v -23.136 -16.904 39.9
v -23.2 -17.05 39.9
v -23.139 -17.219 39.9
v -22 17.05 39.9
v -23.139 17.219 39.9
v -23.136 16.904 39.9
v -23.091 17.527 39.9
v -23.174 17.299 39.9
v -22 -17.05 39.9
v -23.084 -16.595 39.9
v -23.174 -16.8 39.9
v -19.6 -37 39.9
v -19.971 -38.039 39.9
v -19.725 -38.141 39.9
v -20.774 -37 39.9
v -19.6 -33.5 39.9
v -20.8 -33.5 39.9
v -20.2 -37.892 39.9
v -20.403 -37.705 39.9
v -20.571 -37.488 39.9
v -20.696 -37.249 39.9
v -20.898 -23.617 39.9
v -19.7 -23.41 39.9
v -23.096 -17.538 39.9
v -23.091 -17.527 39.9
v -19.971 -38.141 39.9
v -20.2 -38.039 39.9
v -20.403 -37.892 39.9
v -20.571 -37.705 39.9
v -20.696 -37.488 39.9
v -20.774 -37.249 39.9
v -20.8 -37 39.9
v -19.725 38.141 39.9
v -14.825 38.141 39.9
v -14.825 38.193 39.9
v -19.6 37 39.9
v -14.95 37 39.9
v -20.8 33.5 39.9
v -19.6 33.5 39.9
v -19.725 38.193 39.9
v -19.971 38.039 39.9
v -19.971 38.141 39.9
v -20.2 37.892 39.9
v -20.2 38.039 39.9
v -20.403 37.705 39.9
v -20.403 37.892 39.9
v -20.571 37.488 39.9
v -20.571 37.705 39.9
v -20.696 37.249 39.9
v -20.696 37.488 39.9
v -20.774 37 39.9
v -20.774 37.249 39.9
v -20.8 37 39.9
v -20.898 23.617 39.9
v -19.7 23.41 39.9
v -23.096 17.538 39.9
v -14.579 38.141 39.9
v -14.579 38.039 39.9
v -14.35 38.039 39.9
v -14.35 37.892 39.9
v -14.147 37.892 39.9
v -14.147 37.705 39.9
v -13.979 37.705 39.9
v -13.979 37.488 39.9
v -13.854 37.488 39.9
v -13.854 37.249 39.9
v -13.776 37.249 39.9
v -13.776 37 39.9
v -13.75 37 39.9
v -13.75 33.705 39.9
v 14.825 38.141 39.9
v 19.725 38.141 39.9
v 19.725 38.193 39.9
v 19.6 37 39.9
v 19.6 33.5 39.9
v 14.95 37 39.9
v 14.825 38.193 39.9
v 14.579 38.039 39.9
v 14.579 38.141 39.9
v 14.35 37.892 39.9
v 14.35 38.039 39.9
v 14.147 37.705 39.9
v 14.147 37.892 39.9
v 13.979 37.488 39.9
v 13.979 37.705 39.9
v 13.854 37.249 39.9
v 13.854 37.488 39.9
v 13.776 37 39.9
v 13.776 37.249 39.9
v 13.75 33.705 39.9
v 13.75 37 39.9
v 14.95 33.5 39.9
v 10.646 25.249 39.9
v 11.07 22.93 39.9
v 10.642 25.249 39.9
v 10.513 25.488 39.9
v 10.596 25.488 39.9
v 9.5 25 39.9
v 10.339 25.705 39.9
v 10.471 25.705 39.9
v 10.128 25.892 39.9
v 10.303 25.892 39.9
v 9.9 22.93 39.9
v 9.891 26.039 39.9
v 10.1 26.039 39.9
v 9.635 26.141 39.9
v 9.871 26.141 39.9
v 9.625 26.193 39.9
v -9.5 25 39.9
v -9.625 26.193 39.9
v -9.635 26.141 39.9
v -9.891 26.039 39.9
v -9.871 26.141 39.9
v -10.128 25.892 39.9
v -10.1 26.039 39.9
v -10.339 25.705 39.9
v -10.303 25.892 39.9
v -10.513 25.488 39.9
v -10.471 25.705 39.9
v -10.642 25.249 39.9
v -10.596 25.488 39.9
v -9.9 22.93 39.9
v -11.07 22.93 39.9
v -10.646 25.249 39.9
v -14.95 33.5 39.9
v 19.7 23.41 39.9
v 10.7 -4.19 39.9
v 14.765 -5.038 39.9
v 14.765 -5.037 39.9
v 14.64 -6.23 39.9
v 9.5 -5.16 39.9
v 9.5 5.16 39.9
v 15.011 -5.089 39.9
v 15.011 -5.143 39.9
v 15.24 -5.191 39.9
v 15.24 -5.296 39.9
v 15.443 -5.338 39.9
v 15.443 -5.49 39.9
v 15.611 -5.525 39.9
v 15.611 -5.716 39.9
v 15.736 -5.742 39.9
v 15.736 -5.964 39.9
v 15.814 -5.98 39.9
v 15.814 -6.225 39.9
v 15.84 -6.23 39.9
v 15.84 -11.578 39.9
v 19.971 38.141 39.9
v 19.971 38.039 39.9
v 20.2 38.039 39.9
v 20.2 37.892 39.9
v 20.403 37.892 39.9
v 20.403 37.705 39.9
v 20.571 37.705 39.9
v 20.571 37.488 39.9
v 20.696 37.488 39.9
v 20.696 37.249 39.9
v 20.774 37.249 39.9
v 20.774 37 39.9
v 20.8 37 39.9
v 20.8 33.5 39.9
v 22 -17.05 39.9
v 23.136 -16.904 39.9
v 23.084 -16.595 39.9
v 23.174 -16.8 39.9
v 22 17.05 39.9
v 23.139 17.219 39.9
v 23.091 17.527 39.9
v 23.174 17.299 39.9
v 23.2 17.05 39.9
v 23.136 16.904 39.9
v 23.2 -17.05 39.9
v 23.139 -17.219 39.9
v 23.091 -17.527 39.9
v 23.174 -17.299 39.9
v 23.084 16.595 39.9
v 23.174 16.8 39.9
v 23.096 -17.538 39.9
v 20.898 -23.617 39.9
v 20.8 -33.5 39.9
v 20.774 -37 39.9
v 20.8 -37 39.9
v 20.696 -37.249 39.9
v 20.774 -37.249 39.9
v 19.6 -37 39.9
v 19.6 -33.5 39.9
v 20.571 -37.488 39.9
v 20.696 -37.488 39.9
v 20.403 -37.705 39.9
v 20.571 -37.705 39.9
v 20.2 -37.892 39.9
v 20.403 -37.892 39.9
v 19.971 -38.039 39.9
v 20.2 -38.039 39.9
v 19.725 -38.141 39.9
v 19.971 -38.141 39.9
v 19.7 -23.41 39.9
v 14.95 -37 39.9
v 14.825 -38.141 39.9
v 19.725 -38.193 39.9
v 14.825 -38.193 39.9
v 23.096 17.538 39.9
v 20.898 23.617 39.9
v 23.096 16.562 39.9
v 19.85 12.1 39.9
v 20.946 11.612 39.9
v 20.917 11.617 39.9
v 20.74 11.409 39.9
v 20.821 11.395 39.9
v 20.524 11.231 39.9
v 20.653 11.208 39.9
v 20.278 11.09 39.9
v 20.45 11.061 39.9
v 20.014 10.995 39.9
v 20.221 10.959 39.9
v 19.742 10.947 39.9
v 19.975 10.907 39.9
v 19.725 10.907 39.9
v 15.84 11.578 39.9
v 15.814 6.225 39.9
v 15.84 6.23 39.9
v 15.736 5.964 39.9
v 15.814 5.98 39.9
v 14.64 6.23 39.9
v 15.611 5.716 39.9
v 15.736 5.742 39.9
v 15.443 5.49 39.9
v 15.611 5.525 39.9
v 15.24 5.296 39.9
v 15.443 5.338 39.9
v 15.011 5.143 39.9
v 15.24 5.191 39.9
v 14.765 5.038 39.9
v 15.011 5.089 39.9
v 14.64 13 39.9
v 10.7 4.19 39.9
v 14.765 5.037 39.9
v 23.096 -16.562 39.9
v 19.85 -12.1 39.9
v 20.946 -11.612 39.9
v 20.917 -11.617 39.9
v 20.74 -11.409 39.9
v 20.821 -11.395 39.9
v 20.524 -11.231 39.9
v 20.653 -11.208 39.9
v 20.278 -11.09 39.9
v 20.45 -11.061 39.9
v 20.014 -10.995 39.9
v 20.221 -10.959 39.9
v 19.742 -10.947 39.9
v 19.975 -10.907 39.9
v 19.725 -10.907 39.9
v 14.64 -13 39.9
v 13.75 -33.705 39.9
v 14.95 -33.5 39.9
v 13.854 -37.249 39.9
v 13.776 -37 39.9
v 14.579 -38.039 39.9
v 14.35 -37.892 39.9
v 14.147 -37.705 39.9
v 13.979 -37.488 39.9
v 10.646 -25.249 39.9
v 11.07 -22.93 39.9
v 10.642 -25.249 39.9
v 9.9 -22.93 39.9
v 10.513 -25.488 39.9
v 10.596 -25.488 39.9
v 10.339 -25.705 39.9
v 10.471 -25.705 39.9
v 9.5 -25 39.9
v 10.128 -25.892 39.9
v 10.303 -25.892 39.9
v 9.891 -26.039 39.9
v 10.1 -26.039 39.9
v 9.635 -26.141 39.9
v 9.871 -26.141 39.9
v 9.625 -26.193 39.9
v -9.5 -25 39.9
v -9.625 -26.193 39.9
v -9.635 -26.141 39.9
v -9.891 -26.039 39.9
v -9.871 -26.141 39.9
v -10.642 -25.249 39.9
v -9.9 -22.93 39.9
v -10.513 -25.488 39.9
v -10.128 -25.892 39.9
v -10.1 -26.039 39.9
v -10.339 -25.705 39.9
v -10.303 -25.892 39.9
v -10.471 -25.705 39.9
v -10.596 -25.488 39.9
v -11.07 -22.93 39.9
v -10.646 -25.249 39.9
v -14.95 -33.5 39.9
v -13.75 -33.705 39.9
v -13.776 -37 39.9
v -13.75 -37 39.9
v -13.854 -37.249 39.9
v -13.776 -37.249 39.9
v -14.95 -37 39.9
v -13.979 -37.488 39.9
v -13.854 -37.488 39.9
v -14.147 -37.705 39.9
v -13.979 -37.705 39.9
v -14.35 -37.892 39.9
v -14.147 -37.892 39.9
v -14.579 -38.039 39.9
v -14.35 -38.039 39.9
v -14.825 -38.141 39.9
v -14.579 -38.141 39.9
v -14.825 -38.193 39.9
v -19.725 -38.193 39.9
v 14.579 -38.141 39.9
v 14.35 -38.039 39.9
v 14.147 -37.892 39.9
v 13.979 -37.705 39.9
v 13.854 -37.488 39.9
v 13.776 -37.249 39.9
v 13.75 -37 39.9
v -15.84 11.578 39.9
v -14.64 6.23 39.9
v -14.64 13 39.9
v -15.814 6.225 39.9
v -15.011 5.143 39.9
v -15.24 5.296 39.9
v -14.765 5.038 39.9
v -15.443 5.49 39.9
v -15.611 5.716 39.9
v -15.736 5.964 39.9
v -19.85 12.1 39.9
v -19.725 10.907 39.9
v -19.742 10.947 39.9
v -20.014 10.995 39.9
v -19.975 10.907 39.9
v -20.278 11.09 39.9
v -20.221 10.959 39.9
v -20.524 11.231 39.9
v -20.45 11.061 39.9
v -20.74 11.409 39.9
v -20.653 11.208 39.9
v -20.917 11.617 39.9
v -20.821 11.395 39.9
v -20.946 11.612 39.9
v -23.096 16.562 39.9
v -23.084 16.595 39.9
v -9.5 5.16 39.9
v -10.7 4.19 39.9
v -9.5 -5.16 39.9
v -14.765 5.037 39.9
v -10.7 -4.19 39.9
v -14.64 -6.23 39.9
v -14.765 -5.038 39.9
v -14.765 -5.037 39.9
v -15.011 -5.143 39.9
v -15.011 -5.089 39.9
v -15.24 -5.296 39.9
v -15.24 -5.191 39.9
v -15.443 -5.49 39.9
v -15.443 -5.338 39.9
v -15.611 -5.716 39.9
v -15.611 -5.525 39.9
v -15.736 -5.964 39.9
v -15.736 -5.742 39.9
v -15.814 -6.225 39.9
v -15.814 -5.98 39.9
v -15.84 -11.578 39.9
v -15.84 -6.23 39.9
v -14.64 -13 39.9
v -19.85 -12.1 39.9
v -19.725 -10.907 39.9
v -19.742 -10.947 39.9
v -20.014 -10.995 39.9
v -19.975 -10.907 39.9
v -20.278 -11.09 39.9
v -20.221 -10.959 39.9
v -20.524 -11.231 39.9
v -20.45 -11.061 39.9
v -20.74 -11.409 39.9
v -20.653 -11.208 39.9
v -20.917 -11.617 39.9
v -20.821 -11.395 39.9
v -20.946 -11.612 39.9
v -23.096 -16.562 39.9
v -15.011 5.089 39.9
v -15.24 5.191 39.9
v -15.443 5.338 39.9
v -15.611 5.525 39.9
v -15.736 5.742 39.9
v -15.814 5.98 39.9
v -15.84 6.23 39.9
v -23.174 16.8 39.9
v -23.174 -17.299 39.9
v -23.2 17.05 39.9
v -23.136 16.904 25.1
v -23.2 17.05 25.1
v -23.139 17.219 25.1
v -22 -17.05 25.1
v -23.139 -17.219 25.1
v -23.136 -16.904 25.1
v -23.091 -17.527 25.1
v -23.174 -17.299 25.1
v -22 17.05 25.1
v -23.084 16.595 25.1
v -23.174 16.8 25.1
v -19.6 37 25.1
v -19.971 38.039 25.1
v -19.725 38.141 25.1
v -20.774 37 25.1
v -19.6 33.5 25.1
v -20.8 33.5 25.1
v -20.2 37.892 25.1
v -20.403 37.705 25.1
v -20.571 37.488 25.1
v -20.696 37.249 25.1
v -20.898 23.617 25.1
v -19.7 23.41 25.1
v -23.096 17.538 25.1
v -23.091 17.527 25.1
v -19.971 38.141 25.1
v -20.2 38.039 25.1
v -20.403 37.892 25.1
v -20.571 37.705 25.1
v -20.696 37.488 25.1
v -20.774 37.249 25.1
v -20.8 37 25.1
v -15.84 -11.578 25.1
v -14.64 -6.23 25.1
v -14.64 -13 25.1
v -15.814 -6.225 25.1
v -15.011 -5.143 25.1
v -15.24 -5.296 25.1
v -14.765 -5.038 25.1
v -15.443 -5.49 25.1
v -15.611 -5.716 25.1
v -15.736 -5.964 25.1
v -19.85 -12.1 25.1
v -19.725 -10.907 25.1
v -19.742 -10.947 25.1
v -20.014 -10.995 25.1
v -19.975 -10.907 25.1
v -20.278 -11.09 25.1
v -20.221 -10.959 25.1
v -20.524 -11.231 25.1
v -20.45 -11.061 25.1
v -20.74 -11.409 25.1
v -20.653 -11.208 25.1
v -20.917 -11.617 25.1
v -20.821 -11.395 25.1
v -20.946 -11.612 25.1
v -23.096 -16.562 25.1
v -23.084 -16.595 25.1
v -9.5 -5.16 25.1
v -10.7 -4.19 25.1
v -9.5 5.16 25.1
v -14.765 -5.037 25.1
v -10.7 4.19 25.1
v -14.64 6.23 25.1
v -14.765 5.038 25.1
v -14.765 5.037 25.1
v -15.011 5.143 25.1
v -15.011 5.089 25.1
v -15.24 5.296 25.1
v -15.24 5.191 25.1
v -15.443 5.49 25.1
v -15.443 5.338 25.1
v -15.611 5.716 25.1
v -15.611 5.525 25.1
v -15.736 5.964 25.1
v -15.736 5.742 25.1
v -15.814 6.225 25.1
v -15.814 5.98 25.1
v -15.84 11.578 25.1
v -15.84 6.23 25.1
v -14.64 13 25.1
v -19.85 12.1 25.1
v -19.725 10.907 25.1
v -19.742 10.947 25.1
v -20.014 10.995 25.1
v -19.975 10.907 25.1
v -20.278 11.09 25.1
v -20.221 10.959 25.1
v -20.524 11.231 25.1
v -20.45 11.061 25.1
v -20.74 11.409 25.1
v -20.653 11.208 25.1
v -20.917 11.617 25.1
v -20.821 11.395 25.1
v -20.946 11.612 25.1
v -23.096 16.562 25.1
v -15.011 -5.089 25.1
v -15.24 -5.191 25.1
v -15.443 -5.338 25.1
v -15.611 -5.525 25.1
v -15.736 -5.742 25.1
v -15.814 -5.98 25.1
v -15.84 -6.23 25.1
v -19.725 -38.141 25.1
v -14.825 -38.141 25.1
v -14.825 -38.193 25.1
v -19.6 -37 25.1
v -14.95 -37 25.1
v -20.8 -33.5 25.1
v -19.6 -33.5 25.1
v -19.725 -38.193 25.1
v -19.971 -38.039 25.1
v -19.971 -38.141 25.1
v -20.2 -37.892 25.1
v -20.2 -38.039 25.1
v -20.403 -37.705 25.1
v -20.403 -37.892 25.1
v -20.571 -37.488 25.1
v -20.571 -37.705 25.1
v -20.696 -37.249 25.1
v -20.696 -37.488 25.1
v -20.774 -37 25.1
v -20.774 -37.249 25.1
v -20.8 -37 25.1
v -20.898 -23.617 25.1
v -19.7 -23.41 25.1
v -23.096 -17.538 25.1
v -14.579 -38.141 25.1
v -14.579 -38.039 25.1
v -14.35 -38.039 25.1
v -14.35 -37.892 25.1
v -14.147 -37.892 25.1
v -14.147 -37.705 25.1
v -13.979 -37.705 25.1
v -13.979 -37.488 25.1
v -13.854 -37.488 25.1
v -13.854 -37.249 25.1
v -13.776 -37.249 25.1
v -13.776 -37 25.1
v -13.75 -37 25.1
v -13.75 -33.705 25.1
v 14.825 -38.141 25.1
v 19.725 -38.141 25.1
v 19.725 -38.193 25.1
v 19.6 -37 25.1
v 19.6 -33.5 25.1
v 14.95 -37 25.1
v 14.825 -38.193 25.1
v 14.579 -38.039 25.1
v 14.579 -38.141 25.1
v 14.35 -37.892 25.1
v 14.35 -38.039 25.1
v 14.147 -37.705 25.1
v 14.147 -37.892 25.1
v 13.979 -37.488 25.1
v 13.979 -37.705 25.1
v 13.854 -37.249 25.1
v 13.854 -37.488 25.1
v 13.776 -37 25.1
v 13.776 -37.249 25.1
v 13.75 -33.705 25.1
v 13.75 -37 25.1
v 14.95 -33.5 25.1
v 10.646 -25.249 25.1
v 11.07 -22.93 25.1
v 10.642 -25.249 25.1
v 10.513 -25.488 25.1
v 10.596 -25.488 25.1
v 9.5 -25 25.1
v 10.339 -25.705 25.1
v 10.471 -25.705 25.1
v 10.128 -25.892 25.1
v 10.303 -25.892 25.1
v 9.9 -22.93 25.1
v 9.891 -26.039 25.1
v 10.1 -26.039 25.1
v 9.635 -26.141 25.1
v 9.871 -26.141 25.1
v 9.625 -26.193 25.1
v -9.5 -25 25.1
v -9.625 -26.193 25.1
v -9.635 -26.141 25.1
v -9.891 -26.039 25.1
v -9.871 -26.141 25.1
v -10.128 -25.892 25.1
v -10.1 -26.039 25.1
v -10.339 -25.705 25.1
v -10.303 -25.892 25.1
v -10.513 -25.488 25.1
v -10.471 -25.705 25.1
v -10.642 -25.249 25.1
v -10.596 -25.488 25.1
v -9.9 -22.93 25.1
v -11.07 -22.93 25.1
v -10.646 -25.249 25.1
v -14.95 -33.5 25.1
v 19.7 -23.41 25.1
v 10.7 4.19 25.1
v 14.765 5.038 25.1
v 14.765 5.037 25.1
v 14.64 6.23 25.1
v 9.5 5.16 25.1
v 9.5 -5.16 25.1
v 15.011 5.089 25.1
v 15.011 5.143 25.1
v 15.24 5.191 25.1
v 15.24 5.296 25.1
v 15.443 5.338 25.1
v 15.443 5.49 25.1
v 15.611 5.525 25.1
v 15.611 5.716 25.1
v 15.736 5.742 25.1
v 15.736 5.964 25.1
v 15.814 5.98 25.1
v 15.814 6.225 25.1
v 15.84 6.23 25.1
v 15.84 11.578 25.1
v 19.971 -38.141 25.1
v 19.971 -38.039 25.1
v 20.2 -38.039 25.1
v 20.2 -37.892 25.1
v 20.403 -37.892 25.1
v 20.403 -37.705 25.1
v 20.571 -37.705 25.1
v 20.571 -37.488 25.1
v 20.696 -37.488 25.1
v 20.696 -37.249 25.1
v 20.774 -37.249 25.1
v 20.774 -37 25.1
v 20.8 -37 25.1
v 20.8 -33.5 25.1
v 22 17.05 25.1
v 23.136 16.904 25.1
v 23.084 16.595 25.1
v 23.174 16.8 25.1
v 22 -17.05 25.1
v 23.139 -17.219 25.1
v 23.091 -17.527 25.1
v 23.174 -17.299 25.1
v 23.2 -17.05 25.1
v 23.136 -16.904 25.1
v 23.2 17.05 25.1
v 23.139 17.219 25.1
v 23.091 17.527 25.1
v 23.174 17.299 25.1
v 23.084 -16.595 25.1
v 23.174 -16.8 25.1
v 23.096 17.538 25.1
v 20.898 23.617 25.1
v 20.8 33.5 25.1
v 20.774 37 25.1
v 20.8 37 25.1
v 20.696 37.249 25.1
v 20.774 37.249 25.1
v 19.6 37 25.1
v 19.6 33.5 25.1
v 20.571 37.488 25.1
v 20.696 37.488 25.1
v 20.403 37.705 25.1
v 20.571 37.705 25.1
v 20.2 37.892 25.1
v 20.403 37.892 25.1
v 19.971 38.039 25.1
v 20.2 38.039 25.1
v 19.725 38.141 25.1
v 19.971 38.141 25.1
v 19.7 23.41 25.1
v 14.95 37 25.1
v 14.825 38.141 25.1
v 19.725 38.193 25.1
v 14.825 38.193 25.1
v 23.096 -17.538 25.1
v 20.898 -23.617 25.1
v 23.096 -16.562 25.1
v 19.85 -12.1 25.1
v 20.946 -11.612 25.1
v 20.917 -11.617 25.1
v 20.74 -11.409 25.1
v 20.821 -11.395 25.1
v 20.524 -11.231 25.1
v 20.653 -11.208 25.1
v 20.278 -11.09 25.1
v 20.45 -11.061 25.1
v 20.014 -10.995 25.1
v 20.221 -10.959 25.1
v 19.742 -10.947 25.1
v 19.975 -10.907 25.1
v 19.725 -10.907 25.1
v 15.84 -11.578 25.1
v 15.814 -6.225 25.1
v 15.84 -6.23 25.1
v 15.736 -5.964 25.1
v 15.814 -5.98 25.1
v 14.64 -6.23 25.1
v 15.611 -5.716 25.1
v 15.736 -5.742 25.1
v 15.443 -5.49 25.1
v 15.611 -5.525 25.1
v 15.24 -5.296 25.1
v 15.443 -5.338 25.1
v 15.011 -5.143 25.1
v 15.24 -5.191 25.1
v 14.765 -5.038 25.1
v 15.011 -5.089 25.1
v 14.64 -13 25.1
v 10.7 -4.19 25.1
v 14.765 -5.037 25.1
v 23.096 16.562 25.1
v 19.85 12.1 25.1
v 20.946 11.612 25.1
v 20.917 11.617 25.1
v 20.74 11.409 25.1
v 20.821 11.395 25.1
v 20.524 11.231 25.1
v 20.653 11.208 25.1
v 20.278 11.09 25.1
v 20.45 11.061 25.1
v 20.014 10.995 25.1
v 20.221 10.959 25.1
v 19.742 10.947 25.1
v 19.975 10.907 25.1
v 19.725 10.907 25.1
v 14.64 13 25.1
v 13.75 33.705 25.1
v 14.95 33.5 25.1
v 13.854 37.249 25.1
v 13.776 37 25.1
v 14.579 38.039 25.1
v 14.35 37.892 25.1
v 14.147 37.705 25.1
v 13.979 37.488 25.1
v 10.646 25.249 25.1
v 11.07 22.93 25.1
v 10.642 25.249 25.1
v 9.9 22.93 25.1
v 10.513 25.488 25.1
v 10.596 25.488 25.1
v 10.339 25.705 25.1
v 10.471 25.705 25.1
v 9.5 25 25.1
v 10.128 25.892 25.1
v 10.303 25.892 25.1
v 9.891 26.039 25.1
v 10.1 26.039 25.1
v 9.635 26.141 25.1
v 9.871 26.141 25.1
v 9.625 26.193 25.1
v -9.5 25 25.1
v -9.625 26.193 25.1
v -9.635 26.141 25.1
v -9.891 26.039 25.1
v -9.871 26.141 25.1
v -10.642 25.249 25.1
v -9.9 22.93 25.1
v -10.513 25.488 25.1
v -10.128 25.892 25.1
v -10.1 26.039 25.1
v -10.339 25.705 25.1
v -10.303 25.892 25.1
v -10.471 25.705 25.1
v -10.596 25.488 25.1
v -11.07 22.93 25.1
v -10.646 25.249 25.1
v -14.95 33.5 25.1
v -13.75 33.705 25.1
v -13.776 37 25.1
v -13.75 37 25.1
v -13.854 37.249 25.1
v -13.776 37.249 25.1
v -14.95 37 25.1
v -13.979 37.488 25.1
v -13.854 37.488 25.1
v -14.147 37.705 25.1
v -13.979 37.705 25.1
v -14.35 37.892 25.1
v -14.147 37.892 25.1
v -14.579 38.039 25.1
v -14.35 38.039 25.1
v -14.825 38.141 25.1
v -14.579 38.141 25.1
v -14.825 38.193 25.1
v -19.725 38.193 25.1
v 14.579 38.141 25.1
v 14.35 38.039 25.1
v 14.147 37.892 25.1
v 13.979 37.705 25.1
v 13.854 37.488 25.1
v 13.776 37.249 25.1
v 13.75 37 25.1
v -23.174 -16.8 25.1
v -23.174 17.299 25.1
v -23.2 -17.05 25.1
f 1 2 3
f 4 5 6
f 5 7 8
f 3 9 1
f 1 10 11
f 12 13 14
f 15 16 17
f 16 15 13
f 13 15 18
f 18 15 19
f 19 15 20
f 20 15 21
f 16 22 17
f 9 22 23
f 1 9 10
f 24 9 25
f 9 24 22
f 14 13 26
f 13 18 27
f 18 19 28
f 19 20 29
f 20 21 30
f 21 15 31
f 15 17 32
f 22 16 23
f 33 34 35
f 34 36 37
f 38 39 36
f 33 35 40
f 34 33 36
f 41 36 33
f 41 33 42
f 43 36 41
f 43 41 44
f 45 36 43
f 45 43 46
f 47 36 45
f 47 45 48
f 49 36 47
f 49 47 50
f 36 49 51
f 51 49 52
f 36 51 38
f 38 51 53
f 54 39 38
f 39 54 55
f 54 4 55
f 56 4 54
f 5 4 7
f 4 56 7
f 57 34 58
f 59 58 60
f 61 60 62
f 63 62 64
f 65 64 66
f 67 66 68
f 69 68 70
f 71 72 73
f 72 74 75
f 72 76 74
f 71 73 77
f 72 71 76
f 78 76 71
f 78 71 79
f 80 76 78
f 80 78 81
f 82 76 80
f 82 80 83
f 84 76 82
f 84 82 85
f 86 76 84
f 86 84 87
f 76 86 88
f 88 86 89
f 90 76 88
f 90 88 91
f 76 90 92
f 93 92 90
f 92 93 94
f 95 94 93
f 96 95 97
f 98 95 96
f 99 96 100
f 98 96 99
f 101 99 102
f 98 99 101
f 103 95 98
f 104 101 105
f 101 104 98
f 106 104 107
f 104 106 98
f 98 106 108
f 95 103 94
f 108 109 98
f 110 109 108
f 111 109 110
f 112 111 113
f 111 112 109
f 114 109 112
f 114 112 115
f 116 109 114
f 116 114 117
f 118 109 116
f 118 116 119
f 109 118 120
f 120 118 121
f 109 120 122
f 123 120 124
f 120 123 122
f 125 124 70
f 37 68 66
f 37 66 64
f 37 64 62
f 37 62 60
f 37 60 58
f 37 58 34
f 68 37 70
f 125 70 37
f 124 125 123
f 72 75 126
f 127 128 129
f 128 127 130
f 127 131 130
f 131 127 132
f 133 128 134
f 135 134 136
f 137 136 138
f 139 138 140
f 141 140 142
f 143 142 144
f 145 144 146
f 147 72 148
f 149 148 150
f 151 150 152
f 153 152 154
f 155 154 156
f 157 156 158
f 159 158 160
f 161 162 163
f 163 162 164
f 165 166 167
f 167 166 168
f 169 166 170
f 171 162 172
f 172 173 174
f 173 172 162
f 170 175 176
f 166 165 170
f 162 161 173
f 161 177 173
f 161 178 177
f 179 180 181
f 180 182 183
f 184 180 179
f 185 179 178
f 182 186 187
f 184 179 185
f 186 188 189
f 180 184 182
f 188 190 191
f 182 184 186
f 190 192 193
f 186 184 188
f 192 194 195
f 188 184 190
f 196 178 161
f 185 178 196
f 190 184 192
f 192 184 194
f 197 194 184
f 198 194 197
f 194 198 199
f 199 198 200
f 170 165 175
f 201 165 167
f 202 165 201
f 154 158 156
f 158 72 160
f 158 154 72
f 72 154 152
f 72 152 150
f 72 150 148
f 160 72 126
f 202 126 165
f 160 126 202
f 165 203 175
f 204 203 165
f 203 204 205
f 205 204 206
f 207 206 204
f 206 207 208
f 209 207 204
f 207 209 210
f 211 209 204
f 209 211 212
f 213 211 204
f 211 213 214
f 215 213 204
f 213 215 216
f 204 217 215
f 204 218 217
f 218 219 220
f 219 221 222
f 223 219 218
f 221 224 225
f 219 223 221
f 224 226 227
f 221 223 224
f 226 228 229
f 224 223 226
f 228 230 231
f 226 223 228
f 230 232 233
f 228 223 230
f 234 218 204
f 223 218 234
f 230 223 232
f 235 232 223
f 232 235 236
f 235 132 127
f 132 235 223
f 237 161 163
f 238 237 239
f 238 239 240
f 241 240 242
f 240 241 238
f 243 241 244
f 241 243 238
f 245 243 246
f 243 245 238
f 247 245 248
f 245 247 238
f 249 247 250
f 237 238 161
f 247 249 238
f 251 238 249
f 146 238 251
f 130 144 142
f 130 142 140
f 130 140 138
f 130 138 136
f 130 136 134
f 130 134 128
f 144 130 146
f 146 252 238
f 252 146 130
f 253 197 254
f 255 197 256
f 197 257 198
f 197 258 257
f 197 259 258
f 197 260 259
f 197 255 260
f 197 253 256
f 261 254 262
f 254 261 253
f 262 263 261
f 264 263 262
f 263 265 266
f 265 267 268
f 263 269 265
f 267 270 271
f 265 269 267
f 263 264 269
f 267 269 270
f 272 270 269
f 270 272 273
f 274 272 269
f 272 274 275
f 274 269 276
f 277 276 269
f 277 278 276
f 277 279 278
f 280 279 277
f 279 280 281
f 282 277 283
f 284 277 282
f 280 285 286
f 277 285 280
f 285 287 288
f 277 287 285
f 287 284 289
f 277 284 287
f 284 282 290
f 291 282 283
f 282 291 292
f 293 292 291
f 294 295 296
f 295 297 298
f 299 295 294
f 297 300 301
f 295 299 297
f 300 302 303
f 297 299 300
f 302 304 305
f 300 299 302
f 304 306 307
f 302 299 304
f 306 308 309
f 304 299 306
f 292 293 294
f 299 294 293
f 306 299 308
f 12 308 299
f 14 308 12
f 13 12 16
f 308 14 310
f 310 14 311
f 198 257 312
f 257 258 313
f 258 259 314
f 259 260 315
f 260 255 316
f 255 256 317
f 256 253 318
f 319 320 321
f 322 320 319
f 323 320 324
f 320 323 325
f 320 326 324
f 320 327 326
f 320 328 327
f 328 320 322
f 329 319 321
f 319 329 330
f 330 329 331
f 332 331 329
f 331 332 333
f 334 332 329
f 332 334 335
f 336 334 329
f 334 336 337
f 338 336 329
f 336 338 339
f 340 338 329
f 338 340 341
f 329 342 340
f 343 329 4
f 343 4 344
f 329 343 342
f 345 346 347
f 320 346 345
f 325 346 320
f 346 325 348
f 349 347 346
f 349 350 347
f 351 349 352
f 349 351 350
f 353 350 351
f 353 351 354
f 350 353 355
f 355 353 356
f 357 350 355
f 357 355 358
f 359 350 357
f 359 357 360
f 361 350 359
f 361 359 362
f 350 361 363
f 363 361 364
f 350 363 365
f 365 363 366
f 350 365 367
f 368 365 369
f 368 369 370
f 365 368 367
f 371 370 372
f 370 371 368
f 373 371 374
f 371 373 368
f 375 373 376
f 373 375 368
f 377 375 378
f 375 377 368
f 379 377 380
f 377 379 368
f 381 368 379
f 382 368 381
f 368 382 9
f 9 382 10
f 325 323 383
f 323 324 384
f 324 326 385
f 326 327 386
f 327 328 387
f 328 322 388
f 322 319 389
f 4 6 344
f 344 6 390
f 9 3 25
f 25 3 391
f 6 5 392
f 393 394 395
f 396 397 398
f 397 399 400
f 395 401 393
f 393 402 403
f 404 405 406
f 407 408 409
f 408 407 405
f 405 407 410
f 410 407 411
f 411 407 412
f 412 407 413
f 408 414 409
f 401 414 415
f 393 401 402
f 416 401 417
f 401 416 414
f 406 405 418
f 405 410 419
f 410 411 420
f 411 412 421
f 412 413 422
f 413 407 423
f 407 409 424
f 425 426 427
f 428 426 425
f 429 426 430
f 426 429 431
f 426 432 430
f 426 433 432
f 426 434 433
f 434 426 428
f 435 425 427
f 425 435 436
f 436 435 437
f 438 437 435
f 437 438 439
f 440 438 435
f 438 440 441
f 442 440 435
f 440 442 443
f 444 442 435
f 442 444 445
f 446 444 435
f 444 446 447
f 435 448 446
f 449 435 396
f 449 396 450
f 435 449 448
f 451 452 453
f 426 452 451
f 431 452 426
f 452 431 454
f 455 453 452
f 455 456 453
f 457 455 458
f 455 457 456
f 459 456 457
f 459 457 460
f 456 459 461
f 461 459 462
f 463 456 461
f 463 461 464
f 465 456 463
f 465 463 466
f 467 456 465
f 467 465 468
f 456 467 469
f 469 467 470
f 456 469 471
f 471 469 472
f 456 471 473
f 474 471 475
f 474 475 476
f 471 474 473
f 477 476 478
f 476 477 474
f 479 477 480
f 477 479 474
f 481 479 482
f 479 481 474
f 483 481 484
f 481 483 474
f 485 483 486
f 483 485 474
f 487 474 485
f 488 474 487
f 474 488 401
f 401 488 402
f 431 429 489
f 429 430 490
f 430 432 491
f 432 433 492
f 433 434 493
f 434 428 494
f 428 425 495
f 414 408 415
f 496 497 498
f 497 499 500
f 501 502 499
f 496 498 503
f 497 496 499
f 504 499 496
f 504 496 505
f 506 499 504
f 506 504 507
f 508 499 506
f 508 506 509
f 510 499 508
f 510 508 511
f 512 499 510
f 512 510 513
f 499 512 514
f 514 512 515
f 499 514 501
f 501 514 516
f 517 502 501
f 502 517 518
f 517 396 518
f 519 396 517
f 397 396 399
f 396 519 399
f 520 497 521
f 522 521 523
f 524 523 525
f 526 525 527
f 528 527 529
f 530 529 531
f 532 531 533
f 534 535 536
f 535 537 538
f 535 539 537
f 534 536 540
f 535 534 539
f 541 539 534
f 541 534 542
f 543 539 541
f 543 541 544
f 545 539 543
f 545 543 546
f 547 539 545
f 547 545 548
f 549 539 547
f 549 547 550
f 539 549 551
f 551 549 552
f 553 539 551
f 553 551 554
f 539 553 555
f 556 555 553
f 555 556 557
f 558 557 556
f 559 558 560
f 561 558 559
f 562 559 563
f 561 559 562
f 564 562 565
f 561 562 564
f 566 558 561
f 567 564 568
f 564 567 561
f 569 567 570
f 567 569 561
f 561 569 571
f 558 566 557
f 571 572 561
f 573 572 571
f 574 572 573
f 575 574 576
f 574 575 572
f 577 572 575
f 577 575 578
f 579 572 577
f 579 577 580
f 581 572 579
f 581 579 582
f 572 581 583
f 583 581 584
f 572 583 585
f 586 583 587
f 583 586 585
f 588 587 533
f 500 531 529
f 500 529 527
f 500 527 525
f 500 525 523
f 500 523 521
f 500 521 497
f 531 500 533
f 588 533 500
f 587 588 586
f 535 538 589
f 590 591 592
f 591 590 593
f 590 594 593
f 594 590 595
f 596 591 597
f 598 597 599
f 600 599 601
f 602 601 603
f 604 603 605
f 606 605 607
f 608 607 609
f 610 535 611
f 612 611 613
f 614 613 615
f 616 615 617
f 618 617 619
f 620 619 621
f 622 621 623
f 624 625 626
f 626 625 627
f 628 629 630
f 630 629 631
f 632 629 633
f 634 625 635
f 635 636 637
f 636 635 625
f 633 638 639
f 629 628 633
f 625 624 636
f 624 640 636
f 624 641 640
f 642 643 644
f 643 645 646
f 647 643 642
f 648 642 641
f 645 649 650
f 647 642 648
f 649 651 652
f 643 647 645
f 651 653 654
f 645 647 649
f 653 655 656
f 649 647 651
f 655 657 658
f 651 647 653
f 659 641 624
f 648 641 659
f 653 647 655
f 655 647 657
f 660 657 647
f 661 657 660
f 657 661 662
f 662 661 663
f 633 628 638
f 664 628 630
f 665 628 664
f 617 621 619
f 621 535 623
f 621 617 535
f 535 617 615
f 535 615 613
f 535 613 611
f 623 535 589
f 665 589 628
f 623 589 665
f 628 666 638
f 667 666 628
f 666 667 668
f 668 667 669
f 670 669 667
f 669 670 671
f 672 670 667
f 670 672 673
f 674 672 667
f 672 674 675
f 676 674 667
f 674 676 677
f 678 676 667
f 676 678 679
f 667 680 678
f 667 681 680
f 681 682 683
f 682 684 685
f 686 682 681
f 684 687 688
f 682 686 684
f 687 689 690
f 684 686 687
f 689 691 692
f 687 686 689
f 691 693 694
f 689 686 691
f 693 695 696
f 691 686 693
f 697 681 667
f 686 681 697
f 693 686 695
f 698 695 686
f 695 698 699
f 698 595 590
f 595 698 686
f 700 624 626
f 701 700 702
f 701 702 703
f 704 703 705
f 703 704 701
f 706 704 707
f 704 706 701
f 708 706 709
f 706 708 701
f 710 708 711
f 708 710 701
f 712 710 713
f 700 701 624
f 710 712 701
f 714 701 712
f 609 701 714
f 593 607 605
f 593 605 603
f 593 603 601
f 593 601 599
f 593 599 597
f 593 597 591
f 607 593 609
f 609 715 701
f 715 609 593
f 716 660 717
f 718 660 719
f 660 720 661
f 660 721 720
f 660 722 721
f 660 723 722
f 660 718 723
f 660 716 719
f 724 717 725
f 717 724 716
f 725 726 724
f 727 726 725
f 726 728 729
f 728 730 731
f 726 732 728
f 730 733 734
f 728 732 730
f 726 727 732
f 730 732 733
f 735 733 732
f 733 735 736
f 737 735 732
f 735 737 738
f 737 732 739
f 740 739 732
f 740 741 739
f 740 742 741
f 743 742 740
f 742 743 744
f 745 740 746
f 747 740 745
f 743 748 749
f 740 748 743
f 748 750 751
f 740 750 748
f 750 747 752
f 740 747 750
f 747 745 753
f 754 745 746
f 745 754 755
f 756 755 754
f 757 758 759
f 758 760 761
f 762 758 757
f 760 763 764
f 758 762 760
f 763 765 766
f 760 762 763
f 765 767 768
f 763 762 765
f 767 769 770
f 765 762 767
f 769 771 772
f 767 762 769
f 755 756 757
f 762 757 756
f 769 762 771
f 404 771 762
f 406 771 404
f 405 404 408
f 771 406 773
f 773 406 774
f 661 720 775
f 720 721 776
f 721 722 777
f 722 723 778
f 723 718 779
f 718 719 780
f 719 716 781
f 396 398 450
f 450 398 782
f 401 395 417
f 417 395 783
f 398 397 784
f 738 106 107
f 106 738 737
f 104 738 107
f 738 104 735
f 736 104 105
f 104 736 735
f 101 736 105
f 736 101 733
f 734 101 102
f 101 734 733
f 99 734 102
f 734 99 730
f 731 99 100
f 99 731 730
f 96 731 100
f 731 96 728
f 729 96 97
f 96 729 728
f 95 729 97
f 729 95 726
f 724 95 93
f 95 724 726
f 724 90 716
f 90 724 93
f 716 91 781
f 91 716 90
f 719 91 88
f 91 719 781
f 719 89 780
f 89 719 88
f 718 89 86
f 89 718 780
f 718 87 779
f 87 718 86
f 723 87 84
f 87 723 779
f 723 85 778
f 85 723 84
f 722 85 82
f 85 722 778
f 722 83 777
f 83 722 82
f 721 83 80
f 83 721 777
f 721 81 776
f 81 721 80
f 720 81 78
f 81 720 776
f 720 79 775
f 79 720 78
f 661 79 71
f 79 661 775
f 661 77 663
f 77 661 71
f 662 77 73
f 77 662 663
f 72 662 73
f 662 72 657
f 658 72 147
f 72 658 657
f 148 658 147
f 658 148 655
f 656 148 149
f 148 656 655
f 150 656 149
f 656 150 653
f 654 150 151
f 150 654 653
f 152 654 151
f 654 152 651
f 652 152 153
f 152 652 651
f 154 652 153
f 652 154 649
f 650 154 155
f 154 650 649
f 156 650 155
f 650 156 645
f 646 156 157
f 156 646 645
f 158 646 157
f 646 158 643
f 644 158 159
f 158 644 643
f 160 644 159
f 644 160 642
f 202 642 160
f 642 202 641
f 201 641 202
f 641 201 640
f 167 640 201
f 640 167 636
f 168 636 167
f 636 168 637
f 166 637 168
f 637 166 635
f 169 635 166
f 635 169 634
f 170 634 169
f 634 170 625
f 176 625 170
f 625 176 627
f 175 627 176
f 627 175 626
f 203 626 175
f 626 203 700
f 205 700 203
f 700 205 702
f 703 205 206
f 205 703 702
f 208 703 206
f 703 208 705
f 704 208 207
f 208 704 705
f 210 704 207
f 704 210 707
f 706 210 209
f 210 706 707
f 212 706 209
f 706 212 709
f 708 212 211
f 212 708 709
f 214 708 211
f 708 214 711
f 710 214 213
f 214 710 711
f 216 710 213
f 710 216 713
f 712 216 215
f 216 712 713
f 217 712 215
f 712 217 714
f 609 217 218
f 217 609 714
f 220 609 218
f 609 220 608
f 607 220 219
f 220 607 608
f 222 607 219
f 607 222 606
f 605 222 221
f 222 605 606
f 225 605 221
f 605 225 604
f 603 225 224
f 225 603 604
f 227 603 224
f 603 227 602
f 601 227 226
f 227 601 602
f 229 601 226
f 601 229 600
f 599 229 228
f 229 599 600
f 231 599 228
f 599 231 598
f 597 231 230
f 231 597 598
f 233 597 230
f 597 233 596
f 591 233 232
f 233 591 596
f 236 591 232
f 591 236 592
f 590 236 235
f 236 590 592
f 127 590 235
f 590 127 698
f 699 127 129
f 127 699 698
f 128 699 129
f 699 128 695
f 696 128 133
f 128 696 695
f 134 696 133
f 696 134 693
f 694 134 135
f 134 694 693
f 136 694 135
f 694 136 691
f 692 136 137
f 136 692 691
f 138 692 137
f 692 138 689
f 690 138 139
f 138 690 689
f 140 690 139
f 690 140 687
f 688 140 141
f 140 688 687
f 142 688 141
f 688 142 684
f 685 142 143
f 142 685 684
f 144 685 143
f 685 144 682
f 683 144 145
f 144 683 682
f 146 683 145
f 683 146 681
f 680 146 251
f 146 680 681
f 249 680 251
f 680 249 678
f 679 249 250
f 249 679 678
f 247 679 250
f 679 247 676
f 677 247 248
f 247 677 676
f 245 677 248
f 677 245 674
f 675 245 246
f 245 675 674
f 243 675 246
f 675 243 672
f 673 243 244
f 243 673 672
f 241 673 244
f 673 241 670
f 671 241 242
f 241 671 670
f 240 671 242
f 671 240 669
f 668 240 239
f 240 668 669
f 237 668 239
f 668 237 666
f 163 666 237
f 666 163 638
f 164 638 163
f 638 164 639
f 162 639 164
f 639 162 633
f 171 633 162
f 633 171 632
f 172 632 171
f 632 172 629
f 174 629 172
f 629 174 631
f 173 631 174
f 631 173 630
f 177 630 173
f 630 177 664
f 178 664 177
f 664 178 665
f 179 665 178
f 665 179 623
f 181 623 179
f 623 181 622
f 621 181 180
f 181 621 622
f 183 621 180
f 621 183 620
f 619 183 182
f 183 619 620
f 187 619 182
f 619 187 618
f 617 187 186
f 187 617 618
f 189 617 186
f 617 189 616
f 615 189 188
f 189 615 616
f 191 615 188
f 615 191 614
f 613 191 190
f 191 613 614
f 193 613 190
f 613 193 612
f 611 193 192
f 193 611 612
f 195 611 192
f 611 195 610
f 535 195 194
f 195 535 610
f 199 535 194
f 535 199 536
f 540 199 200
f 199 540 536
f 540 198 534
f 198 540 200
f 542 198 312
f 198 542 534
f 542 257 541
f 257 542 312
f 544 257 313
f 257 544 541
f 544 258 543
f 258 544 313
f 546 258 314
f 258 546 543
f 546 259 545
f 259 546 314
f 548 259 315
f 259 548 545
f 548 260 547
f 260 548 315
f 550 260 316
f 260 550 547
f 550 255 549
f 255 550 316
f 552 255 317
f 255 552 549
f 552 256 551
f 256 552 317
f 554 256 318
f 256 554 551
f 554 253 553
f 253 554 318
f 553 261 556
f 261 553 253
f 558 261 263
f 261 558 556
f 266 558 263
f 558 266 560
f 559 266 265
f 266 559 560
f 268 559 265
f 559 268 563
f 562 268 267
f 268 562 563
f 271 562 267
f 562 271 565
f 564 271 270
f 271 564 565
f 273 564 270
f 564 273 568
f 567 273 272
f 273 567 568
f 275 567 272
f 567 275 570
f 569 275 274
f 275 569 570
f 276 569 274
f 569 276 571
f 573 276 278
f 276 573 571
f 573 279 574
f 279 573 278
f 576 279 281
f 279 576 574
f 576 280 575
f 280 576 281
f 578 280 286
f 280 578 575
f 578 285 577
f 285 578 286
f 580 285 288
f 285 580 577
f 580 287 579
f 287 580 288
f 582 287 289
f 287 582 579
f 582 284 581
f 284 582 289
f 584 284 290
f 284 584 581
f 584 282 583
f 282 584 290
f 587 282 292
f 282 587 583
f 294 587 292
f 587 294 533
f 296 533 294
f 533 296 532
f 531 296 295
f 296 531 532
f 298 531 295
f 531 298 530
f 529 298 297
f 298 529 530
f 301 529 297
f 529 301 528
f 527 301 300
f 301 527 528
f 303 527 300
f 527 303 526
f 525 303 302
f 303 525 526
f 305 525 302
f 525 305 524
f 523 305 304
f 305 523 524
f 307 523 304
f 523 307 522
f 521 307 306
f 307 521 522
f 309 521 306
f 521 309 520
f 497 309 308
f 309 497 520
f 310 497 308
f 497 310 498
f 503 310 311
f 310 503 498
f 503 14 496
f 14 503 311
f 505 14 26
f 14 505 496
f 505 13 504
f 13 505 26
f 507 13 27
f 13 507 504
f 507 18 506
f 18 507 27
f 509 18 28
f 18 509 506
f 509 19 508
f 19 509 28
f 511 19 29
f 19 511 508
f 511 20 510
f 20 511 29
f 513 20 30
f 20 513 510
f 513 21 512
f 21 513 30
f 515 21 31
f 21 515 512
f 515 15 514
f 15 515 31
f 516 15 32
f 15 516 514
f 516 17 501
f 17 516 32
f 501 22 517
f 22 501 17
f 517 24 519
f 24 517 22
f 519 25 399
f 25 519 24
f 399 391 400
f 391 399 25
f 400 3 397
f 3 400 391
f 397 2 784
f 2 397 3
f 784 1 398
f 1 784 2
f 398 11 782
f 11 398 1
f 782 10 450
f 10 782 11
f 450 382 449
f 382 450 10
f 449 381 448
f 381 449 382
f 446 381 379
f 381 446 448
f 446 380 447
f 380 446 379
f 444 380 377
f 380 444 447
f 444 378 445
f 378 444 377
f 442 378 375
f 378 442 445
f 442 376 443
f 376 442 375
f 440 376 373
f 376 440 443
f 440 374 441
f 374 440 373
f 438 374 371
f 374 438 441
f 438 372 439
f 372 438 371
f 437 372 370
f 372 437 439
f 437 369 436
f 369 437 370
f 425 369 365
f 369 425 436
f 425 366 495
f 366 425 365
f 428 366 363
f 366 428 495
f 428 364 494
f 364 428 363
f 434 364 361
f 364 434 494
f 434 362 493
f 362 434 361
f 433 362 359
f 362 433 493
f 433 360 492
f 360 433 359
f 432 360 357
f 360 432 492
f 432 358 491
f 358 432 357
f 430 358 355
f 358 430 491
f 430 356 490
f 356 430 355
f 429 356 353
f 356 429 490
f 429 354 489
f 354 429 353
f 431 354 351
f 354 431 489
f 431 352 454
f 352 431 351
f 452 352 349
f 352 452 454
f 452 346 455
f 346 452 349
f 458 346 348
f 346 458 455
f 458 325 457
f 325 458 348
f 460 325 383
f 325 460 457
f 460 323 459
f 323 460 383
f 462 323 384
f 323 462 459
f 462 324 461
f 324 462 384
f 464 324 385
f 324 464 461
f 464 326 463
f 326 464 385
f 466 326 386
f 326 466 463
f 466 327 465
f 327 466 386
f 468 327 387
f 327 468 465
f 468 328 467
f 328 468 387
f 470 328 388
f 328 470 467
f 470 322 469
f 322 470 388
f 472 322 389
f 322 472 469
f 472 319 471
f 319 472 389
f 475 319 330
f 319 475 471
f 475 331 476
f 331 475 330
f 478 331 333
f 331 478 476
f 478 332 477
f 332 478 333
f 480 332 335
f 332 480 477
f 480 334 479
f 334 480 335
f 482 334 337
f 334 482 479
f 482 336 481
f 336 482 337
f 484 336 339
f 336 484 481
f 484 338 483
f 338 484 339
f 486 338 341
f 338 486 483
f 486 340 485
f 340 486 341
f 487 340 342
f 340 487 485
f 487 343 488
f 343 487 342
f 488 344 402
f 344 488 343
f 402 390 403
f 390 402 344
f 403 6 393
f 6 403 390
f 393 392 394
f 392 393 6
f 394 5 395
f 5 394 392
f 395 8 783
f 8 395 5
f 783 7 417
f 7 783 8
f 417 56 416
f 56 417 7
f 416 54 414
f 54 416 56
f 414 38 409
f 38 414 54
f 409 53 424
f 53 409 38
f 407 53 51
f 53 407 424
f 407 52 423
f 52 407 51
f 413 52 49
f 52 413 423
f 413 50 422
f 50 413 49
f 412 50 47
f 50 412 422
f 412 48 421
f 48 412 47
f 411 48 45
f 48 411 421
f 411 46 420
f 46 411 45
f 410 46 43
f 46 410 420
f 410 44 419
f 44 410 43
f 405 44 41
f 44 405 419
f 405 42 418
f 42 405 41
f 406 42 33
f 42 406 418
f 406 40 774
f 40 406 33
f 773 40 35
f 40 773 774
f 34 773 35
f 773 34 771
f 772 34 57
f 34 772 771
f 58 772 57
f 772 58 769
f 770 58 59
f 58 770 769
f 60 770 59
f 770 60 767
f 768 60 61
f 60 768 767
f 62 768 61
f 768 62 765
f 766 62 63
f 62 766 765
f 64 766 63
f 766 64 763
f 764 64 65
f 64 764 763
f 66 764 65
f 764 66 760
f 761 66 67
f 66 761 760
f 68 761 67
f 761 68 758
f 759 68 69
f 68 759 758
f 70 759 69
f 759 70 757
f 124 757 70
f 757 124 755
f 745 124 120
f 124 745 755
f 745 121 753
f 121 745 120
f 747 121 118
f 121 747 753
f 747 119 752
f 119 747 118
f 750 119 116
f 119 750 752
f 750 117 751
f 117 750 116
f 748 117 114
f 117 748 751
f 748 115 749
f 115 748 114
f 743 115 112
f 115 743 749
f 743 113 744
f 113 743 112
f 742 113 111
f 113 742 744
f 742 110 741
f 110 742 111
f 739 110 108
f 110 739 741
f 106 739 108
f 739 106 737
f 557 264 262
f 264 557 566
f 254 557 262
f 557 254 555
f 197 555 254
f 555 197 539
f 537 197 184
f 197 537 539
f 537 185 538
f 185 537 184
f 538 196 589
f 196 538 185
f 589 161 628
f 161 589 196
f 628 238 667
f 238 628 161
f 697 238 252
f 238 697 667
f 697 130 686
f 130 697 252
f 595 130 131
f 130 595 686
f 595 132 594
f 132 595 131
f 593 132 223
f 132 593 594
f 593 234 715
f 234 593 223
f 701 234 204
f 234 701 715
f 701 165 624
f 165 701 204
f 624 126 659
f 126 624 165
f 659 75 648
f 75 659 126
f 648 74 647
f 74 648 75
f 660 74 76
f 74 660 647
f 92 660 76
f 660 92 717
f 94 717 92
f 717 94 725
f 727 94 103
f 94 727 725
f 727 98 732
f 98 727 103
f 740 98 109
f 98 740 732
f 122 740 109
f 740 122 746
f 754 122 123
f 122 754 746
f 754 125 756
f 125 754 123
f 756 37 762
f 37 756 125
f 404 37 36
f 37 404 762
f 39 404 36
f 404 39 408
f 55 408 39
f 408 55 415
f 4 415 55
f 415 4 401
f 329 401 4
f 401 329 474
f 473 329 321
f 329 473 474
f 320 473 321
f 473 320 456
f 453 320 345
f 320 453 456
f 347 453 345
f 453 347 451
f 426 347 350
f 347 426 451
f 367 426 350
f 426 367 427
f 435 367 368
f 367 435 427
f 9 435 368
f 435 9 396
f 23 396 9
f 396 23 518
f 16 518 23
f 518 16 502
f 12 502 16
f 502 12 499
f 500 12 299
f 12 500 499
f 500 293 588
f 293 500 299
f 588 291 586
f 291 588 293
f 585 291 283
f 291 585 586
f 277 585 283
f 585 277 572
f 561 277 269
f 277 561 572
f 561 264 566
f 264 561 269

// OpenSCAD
/* starviper-bin.scad
 *
 * Copyright (C) Robert B. Ross, 2016
 *
 * This software is released under the Creative Commons Attribution
 * License. It is derived from the model by ThisIsDavin
 * as downloaded on 4/29/2016 from the following URL:
 *   http://www.thingiverse.com/thing:1515669
 *
 * Specifically, the outline of the Starviper was extracted from 
 * ThisIsDavin's model.
 */

include <./bintools.scad>

$fn=160;
binHeight   = 46.5;
angle=0;

/* locations is a pair of triples, translate : rotate pairs
 */
locations = [[[0,0,0], [0,0,0]]];

// harborFreightLargeHalfHt(locations,inset=1) starviperBlank();

// starviperBlank();
starviperOutline();

/* starviperOutline() -- test piece for outline
 */
module starviperOutline() {
   translate([0,0,40]) rotate([180,0,0]) {
      blankCutout(height=15 - 0.1, outlineScale=1.2) starviperBlank();
   }
}

module starviperBlank(centerCutout=1) {
   blankHeight = 42; 
   
   /* rotate, etc. positions blank upside-down on XY plane */
   rotate([180,0,0]) translate([0,0,-binHeight]) union() {
      difference() {
         translate([0,0,binHeight- (blankHeight-7)])
            linear_extrude(height=blankHeight-7) starviperShell();
         // translate([0,0,binHeight-blankHeight]) bottomAngleCutout();
      }
      if (centerCutout) linear_extrude(height=binHeight) centerCutoutPoly();
   } /* rotate, translate, union */
}

/* starviperShell() -- outline, adapted from Slannesh's model */
module starviperShell() {
   for (j=[0:1]) mirror([j,0,0])
   for (i=[0:1]) mirror([0,i/2,0]) 
      polygon(points=[[-0.1,-0.1], [9.5,-0.1], [9.5,5.16], [14.64,6.23],
                      [14.64,13],[19.85,12.1],[22,17.05], [19.7,23.41],
                      [19.6,33.5], [19.6,37], [14.95,37], [14.95,33.5],
                      [11.07,22.93], [9.9,22.93], [9.5,25],[-0.1,25]]);
}

/* bottomAngleCutout() -- defines the "height" of the bottom of the blank,
 *                        where it touches the model.
 *
 * NOTE: NOT USED FOR THIS MODEL. I'm simply trying to further refine my
 *       process.
 */
module bottomAngleCutout() {
   translate([0,52,0]) rotate([90,0,0]) linear_extrude(height=104)
      polygon(points=[[-75, 6.92], [-36.46, 12.69], [32.47, 27], [72.13,37],
                      [72,0], [-73.7,0]]);
}

/* centerCutoutPoly() -- defines a polygon to be cut all the way to the
 *                       bottom of the bin.
 *
 * NOTE: NOT USED FOR THIS MODEL.
 */
module centerCutoutPoly() {
}

/*
 * Local variables:
 *  mode: C
 *  c-indent-level: 3
 *  c-basic-offset: 3
 * End:
 *
 * vim: ts=8 sts=3 sw=3 expandtab
 */
